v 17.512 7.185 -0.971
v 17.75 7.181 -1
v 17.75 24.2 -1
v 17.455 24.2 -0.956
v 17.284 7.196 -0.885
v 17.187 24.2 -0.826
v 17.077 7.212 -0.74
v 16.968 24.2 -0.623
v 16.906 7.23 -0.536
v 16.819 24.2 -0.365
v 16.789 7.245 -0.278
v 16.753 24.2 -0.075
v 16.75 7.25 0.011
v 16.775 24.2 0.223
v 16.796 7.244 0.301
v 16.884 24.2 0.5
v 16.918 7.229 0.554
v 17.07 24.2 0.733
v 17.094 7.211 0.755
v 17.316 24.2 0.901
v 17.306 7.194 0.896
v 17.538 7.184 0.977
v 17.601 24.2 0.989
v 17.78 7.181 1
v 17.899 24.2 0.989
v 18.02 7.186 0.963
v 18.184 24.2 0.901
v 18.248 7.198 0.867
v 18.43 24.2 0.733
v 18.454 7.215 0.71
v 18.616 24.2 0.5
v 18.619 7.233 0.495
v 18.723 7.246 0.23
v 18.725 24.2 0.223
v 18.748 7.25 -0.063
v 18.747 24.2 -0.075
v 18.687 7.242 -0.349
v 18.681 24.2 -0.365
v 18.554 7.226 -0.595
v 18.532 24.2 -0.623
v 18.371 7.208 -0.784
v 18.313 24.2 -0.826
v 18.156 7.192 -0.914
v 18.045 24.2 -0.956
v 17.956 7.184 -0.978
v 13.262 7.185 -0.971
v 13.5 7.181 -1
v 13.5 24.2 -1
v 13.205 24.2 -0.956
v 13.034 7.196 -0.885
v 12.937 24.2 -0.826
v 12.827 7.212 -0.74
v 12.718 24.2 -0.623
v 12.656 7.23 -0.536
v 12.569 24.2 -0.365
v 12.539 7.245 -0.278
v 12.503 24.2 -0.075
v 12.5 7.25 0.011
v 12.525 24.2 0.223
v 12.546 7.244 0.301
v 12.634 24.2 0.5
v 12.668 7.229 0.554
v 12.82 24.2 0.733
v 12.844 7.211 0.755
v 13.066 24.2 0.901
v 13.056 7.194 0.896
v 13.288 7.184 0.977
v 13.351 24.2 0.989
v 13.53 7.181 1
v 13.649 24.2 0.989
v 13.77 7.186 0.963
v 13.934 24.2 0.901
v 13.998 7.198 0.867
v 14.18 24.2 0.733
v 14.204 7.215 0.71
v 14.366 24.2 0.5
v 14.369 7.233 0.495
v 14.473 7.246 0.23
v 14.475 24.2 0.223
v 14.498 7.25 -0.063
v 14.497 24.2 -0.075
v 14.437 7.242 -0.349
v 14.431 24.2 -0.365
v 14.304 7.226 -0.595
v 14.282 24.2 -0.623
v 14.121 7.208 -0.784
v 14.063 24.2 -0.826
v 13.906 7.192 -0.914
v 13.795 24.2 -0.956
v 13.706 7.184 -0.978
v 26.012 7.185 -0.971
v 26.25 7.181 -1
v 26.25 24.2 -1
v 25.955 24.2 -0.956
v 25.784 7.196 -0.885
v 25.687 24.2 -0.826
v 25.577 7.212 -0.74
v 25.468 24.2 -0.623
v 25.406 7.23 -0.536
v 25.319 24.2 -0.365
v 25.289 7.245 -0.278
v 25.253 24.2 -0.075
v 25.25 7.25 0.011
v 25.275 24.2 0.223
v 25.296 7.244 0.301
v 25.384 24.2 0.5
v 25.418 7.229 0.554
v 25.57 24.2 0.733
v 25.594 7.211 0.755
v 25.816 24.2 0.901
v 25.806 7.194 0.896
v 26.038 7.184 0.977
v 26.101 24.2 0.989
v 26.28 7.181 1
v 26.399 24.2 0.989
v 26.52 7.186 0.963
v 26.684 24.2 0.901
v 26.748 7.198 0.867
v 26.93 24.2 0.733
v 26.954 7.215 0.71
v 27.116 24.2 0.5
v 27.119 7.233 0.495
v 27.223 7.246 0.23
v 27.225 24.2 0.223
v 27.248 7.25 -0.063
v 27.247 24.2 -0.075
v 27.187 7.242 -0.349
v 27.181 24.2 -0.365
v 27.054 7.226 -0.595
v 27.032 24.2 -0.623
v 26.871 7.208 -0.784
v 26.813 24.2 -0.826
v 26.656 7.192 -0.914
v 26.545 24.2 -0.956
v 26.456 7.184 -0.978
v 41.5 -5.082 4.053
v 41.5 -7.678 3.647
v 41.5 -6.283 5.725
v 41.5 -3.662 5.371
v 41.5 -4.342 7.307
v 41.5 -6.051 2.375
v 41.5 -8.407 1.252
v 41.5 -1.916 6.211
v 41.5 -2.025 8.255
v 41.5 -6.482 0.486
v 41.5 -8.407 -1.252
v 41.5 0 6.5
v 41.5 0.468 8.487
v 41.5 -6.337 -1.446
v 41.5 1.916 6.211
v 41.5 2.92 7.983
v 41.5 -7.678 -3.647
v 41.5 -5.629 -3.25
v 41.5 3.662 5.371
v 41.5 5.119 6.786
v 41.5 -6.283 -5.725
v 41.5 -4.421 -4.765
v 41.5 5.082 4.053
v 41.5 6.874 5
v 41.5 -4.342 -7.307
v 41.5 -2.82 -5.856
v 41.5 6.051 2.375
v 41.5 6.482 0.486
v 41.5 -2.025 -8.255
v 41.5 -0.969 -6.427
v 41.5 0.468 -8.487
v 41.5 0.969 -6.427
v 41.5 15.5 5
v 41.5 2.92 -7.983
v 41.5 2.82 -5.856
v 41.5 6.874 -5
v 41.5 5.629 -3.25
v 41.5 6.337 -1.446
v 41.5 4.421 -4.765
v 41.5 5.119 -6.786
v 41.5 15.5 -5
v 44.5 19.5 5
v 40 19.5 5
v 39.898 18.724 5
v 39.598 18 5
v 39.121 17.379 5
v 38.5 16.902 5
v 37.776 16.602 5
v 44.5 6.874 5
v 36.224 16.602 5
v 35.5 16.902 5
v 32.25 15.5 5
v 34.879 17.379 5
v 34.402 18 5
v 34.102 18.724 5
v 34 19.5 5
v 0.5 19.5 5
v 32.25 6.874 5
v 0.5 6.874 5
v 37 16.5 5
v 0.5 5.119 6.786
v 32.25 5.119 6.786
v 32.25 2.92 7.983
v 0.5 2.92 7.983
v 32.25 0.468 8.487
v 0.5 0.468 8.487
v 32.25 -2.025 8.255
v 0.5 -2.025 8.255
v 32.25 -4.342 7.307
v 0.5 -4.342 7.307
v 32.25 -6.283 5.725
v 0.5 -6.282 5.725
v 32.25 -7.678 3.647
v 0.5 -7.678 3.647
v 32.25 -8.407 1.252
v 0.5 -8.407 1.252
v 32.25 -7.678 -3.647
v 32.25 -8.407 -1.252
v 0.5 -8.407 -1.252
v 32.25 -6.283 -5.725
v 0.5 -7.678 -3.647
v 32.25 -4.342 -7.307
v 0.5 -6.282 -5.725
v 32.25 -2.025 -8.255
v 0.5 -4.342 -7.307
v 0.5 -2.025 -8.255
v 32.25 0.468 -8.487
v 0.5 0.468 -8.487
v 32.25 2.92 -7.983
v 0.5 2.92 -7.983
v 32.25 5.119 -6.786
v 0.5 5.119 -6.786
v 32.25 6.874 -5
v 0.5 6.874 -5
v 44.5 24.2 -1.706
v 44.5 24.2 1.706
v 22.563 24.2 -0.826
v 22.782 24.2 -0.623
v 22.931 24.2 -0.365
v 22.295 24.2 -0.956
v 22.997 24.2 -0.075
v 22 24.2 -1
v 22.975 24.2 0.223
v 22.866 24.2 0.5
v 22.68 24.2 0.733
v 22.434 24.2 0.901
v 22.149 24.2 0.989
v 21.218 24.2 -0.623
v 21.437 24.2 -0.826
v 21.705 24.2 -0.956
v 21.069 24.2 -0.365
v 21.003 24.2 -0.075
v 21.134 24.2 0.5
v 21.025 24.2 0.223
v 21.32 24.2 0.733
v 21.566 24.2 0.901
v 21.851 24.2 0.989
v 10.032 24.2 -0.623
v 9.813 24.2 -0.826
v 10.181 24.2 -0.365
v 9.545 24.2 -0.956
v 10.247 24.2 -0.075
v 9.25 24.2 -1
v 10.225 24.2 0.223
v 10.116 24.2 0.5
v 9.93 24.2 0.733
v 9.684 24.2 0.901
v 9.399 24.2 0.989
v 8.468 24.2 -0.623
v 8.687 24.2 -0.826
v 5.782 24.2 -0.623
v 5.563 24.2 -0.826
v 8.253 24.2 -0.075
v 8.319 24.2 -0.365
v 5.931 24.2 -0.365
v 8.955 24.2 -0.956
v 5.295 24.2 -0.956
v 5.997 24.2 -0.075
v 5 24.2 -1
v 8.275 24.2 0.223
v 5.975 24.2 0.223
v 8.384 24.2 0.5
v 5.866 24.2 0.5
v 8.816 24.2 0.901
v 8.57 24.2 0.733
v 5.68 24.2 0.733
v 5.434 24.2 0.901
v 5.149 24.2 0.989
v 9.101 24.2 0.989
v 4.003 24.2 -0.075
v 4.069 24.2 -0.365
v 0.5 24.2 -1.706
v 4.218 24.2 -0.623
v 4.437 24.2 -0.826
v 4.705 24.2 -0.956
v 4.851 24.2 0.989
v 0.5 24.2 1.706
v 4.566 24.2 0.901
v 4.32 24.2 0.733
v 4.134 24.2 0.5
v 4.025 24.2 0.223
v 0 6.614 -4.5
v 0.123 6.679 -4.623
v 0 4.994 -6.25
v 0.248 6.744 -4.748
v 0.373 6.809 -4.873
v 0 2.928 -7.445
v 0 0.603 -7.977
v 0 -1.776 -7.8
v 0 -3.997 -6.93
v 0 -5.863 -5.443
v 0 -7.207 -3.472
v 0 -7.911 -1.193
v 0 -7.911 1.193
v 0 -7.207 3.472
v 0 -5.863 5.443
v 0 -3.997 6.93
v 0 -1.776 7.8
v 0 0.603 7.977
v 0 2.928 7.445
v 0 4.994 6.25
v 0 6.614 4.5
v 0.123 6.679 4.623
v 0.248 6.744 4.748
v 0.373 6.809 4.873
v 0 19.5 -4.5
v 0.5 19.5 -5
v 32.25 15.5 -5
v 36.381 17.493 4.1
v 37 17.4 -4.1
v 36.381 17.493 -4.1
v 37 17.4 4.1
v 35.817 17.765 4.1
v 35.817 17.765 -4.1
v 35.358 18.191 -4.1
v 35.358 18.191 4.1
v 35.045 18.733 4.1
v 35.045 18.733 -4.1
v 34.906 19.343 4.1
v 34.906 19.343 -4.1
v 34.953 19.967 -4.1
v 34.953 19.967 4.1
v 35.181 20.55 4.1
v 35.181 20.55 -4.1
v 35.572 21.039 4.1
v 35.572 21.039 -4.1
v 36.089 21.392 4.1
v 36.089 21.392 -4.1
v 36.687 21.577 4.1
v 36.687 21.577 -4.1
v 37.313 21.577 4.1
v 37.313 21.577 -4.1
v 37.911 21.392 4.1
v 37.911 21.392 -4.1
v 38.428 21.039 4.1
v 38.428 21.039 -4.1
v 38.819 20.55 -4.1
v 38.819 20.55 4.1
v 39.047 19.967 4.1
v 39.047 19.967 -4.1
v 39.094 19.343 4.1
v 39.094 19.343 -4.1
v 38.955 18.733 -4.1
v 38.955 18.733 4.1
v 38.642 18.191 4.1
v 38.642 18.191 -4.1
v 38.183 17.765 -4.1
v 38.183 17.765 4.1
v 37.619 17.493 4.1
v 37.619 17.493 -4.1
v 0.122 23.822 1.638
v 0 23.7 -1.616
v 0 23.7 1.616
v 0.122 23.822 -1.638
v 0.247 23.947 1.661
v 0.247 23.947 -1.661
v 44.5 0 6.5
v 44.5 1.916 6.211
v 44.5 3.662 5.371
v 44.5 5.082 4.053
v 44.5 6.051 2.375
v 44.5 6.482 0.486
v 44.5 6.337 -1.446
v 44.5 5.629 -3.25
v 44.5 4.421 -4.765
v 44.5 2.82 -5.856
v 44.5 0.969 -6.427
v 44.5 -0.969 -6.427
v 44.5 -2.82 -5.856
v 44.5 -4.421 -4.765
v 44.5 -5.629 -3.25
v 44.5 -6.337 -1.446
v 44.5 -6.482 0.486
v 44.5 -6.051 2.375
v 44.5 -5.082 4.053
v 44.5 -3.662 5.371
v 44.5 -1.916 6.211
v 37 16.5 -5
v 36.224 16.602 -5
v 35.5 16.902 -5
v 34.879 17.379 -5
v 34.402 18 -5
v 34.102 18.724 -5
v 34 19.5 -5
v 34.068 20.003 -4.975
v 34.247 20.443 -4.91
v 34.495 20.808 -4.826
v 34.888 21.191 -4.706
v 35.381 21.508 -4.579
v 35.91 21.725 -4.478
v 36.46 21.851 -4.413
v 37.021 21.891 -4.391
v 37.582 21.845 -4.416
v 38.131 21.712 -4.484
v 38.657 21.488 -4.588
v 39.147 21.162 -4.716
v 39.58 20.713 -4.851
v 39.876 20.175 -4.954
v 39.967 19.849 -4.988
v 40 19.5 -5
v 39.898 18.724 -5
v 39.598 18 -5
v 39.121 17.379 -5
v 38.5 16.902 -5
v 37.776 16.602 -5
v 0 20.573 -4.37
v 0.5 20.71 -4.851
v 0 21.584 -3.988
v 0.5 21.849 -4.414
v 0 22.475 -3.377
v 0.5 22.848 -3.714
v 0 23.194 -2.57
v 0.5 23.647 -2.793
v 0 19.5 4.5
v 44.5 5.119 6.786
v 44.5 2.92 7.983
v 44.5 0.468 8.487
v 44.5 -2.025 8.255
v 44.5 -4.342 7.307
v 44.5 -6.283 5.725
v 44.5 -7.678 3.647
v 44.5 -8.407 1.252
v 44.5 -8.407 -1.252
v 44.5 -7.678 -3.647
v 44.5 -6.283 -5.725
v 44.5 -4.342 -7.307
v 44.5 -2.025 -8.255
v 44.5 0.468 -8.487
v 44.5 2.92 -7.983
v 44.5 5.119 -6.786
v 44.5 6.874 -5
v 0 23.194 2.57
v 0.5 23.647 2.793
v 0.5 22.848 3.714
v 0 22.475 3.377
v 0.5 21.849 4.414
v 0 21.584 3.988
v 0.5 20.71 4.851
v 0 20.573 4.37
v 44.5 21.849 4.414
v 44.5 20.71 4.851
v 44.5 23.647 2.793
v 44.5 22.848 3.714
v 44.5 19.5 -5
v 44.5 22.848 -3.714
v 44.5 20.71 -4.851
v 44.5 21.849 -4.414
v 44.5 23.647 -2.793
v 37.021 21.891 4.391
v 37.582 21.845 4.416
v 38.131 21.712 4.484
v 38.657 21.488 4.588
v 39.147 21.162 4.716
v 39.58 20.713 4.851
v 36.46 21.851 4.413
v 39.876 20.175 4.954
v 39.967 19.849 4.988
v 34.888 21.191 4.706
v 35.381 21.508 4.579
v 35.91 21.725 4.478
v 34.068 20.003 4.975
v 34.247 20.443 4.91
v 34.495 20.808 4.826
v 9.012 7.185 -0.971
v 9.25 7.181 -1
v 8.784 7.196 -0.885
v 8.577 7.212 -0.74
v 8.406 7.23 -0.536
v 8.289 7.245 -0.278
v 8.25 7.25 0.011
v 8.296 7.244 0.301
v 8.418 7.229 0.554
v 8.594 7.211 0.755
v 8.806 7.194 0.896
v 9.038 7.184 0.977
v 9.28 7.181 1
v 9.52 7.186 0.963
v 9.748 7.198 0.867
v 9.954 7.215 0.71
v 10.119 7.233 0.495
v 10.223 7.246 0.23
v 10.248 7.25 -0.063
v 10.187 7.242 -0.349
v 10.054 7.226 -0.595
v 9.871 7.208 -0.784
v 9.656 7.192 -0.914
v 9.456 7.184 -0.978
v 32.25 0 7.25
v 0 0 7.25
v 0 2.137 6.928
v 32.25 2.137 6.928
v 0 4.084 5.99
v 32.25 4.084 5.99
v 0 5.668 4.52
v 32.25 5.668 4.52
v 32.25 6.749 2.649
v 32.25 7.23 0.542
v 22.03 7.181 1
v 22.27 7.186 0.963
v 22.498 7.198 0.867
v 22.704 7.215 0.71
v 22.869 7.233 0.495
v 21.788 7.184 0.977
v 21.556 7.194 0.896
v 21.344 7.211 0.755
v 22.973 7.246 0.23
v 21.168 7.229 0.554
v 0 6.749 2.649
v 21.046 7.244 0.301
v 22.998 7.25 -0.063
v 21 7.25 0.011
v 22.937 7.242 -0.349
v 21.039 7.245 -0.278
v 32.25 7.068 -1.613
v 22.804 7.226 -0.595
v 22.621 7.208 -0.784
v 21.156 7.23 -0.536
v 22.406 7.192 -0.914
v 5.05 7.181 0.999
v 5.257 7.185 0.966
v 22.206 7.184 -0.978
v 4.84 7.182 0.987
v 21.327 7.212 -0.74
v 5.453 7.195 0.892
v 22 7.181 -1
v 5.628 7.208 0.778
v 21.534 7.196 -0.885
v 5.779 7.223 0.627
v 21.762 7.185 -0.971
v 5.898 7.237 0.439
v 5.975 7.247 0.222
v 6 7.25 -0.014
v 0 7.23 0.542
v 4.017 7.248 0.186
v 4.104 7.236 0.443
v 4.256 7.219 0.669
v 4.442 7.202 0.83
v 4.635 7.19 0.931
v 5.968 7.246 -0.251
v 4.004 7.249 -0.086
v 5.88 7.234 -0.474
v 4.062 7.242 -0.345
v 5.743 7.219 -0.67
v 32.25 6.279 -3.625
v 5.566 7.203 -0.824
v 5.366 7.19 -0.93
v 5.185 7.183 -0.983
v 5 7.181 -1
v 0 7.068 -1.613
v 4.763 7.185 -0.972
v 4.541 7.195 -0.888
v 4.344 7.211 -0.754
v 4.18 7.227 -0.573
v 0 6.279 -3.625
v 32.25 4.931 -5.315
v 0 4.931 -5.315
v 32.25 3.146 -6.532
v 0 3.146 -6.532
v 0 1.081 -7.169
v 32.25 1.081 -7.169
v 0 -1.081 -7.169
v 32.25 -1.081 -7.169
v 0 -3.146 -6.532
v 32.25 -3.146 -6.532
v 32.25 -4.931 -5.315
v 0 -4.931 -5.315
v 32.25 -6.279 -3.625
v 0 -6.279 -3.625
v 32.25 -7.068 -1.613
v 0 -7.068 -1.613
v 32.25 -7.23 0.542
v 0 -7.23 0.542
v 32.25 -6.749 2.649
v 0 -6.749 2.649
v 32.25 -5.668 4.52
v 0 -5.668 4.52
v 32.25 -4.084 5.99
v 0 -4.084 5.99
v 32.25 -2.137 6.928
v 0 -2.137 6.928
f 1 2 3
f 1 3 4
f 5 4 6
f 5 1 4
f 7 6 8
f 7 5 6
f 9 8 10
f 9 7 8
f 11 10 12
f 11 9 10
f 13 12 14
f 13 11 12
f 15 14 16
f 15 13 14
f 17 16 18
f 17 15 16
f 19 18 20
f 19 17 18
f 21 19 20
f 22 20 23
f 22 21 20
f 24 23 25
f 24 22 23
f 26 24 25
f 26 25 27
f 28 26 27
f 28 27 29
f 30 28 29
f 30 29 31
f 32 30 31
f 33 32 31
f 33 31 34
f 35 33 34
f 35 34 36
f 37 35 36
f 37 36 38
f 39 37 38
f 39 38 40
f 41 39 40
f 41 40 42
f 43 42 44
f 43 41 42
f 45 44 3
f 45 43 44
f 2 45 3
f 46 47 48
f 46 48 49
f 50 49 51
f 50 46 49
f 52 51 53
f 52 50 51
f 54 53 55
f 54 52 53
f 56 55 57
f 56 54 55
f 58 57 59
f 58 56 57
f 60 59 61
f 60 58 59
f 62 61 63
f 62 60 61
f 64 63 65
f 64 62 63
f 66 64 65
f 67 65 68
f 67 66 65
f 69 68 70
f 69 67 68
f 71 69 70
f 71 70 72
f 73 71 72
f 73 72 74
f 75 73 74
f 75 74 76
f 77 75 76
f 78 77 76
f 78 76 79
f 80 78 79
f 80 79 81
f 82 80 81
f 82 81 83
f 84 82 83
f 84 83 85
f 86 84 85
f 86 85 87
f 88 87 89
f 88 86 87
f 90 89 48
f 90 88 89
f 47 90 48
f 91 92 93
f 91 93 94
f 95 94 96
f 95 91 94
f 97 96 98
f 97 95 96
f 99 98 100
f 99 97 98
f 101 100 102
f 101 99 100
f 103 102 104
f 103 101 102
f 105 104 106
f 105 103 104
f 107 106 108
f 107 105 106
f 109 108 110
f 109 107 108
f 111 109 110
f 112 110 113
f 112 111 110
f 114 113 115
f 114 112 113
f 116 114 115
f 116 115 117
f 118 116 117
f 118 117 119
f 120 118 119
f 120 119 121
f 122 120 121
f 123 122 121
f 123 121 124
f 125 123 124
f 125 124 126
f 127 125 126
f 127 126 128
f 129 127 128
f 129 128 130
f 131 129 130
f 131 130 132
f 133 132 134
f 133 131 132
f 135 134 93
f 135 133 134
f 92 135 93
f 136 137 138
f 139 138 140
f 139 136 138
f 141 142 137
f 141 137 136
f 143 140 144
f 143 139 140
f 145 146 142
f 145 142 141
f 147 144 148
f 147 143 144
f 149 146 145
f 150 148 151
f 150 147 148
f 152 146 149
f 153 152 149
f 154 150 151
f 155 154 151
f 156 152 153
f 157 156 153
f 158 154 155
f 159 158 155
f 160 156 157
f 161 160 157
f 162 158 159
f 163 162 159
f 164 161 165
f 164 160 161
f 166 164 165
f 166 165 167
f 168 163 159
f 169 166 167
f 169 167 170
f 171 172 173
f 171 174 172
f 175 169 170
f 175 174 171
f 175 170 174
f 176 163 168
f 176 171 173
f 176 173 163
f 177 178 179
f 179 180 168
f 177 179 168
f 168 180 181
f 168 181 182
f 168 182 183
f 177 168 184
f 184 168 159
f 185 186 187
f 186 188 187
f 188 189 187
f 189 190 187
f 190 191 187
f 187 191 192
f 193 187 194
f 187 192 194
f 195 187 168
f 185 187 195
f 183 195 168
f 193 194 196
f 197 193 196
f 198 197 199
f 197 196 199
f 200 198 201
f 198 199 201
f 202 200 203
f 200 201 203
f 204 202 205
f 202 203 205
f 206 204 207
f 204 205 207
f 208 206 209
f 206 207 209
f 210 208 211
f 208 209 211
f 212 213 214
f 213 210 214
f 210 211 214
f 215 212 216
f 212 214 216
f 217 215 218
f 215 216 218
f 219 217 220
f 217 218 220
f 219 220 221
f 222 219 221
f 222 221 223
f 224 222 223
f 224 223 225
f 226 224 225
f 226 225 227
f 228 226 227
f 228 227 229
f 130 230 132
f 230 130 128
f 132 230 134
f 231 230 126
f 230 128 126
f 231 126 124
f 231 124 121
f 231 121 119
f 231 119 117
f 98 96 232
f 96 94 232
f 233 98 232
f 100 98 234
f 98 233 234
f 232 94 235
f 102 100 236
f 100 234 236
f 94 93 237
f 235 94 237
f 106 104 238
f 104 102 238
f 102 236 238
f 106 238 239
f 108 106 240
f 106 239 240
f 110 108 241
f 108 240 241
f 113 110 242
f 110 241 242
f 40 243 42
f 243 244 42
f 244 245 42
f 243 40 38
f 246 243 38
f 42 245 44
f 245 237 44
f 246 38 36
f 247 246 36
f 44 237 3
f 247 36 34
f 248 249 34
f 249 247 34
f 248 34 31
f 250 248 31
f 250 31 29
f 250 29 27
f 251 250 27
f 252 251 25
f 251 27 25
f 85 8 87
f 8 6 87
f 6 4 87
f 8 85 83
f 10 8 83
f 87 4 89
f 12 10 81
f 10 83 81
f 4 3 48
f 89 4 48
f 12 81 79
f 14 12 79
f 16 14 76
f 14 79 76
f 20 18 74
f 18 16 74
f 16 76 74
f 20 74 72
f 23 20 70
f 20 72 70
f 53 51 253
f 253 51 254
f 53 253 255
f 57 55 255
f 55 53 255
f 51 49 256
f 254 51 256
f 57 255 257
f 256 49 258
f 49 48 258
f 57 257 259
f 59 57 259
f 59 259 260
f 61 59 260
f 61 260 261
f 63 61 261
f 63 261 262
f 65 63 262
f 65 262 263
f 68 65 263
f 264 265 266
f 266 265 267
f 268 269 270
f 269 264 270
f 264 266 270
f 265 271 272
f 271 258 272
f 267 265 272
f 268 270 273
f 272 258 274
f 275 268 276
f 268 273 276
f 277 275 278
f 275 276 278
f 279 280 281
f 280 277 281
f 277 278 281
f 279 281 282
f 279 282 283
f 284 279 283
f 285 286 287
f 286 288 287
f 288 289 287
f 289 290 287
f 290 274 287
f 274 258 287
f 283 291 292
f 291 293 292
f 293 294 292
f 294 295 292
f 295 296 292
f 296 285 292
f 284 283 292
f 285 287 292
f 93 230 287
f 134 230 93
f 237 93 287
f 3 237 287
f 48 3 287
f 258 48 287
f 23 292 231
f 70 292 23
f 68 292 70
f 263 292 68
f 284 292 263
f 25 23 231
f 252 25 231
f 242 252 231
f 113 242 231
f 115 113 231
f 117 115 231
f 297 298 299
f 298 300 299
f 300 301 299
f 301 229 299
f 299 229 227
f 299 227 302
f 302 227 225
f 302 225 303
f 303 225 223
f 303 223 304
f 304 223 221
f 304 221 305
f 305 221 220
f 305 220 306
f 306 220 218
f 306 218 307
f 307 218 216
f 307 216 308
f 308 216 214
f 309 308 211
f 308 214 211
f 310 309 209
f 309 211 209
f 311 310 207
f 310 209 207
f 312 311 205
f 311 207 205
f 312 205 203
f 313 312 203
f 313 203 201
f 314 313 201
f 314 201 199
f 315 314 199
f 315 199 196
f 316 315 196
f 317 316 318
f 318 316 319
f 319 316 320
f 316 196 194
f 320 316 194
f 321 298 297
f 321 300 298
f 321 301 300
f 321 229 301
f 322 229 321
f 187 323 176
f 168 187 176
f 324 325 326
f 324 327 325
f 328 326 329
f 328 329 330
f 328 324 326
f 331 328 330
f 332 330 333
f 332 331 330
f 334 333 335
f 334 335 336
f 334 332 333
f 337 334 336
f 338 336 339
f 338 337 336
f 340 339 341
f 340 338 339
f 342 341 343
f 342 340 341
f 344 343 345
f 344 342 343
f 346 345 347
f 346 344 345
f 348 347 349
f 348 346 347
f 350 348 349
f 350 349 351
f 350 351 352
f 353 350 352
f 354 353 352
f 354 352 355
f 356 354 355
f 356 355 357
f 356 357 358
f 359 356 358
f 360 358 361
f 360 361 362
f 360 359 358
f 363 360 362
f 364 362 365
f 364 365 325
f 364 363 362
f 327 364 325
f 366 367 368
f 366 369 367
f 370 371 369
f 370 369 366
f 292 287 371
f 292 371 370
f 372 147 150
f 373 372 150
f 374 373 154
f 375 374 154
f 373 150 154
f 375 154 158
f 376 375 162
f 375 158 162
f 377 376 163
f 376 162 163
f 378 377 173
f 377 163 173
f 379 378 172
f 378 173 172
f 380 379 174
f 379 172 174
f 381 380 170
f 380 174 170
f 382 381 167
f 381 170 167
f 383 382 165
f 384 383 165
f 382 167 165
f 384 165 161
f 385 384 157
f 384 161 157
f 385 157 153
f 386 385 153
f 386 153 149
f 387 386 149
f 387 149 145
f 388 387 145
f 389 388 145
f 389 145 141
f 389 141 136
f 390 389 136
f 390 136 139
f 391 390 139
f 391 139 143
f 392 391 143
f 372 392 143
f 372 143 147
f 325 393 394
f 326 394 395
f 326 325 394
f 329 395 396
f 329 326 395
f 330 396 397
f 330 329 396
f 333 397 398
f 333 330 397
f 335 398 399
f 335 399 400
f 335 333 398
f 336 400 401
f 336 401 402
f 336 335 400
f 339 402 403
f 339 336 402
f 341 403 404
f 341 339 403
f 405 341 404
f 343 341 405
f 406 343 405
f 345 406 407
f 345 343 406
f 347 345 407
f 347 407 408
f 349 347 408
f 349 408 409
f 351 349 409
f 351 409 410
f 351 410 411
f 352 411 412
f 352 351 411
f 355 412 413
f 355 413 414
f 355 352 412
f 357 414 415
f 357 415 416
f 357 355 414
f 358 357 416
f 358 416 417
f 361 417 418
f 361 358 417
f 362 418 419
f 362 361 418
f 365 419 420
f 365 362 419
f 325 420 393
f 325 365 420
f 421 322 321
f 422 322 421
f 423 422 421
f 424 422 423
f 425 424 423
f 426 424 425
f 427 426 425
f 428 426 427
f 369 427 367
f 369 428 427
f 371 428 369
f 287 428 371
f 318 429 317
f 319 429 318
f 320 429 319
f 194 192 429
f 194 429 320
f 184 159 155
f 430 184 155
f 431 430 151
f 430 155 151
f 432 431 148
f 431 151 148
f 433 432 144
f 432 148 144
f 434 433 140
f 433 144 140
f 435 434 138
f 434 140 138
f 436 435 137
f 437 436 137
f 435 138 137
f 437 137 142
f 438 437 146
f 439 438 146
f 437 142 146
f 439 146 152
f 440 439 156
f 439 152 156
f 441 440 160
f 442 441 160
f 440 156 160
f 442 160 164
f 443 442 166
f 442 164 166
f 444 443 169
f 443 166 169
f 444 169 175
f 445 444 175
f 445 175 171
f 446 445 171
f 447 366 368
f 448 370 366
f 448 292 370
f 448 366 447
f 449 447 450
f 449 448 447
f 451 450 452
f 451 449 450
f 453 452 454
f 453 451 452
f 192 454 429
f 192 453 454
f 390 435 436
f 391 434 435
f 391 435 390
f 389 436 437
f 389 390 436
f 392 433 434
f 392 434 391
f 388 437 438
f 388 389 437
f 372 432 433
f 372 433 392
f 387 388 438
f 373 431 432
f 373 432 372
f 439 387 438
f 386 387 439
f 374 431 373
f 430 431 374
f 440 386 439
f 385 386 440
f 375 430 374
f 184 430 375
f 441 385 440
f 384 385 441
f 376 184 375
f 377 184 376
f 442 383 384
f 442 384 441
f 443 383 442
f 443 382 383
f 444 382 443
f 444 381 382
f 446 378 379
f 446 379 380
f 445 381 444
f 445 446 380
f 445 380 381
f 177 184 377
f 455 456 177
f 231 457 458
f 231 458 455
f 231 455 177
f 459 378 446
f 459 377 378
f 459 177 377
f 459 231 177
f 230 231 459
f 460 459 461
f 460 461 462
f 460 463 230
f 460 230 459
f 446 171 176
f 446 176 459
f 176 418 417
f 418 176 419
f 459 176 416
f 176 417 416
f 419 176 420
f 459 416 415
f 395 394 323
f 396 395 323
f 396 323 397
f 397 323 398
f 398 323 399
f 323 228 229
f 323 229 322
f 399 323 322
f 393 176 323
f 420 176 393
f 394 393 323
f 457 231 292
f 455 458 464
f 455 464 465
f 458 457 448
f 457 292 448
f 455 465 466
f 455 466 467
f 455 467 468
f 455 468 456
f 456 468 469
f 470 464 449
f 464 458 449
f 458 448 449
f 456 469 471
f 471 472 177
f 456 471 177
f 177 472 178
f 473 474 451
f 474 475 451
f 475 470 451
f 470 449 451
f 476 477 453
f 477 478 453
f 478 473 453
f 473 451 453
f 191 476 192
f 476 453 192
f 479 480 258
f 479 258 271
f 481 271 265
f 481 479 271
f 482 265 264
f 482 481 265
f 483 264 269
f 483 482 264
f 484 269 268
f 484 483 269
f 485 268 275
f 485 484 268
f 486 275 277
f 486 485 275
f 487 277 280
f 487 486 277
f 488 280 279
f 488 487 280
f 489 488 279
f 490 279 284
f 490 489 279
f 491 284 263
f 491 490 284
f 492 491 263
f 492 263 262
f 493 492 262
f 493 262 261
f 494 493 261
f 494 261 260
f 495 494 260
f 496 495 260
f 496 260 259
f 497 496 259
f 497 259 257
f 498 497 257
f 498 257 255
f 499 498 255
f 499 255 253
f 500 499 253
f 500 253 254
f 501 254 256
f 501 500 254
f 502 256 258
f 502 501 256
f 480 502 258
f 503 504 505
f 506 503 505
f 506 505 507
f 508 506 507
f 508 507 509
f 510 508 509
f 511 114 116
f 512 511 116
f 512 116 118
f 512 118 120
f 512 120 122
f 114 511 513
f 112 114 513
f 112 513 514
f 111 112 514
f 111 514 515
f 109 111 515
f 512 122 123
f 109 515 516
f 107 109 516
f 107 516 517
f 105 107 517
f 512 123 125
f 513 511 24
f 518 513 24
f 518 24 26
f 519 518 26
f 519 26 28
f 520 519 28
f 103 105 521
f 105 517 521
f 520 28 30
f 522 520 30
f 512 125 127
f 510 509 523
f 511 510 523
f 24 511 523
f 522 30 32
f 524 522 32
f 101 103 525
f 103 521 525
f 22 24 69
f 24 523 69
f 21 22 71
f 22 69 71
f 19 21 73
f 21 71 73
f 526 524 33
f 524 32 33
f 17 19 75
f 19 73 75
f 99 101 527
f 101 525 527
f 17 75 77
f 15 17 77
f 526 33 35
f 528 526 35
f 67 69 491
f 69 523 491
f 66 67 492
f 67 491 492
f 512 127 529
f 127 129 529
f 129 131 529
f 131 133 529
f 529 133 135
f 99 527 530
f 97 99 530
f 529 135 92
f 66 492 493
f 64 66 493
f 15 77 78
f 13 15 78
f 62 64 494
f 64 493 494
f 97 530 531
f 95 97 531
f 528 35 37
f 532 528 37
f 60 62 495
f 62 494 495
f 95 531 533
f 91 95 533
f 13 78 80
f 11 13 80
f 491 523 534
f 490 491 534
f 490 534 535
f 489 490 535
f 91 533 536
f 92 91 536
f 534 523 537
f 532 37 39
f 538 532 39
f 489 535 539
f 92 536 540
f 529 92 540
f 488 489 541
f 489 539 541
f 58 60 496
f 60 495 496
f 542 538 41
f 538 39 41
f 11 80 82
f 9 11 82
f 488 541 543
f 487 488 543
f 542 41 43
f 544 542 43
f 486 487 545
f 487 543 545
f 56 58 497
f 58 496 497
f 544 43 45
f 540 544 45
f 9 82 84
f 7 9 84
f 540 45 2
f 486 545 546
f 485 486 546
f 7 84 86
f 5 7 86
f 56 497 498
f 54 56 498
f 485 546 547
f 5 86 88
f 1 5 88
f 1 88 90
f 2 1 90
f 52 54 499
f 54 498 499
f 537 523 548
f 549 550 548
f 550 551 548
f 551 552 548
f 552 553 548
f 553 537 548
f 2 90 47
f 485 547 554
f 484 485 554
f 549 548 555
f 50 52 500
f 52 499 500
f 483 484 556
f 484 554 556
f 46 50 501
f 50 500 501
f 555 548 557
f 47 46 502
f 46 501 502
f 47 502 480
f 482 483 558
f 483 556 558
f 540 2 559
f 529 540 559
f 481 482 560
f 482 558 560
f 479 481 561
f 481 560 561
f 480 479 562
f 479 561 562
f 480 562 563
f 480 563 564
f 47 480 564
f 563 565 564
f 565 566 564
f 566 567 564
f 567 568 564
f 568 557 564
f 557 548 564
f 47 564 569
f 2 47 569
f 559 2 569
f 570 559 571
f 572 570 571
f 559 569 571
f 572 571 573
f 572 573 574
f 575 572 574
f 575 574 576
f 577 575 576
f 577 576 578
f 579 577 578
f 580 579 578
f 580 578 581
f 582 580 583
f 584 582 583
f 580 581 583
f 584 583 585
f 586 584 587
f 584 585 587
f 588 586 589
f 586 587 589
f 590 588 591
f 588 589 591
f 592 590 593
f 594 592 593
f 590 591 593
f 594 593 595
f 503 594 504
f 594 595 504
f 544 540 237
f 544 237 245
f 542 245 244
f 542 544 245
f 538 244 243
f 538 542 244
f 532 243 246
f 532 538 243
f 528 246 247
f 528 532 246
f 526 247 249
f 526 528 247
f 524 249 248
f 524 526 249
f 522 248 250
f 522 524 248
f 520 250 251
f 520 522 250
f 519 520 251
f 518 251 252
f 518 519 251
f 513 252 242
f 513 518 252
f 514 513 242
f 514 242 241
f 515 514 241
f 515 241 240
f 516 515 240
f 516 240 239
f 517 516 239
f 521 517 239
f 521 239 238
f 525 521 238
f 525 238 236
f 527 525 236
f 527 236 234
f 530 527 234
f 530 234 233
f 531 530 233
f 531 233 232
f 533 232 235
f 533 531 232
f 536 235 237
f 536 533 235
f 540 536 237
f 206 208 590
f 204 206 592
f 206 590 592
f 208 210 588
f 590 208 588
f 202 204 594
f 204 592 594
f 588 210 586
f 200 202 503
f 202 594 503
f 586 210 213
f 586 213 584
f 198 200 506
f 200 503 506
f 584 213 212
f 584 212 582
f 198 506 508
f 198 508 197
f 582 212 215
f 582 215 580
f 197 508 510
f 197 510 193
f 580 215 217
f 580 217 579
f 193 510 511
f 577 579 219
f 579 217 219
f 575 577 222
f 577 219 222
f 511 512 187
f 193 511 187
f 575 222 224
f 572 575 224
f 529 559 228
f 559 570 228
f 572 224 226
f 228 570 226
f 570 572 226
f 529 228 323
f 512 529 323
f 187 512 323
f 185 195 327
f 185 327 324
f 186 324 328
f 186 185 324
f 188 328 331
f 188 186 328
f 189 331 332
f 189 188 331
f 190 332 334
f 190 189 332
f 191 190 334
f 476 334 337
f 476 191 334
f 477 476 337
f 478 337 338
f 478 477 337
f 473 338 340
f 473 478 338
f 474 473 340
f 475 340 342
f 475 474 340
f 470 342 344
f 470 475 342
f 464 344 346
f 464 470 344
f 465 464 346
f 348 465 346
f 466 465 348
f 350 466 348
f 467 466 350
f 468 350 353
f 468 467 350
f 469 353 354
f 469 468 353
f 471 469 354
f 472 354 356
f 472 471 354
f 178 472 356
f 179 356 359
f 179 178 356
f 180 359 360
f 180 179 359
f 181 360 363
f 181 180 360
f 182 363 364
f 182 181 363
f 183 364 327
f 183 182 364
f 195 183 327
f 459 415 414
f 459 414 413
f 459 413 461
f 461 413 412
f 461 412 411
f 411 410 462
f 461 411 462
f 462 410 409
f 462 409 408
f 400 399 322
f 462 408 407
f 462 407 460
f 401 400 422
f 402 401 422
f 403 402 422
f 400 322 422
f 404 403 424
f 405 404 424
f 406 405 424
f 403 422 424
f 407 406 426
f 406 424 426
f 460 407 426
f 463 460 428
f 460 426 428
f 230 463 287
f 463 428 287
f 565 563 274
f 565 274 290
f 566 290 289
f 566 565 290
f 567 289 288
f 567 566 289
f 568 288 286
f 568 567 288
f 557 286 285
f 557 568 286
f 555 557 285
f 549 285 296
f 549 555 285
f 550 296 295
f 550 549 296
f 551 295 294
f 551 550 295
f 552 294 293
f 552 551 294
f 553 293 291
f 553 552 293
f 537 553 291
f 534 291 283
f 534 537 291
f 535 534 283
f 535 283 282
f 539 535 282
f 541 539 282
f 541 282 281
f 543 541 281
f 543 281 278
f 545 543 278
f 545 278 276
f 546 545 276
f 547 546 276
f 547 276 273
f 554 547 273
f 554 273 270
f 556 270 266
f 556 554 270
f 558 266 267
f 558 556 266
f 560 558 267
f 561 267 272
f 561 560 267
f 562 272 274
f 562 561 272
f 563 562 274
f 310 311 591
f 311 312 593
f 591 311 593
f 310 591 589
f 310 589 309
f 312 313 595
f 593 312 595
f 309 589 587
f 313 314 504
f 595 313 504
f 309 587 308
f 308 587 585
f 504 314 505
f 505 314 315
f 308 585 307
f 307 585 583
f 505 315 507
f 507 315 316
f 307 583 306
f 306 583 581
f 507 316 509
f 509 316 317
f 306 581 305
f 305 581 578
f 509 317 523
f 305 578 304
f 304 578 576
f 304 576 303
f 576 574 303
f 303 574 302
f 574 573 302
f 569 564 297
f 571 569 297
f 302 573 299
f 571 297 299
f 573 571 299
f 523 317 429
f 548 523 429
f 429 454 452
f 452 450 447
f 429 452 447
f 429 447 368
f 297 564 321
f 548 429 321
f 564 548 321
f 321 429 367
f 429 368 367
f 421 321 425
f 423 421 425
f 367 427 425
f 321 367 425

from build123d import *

# Parameters (mm, degrees)
EURO_CYLINDER_OUTLINE_DEPTH = 44.5
SKETCH9_R                   = 7.25
BORE_FOR_CORE_DEPTH         = 37
SKETCH2_R                   = 1
HOLE_FOR_PIN_DEPTH          = 35
LPATTERN_OF_6_COUNT         = 6
LPATTERN_OF_6_PITCH         = 4.25
OPENNING_DEPTH              = 53.422705051
OPENNING_DEPTH_BACK         = 53.422705051
SKETCH3_W                   = 9.25
SKETCH3_H                   = 24
F_0_5_X_45_DEG_SIZE         = 0.5
SKETCH10_R                  = 6.5
DIA_13_END_BIT_DEPTH        = 49.786678644


with BuildPart() as part:
    # Sketch1 → euro cylinder outline (new body)
    with BuildSketch(Plane(origin=(0, 0, 0), x_dir=(0, 0, -1), z_dir=(1, 0, 0))):
        with BuildLine():
            Line((-5, 19.5), (-5, 6.873863542))
            ThreePointArc((-5, 6.873863542), (0, -8.5), (5, 6.873863542))
            Line((5, 6.873863542), (5, 19.5))
            ThreePointArc((5, 19.5), (4.094469505, 22.369724634), (1.705872211, 24.2))
            Line((1.705872211, 24.2), (-1.705872211, 24.2))
            ThreePointArc((-1.705872211, 24.2), (-4.094469505, 22.369724634), (-5, 19.5))
        make_face()
    extrude(amount=EURO_CYLINDER_OUTLINE_DEPTH)

    # Sketch9 → bore for core (cut)
    with BuildSketch(Plane.ZY):
        Circle(SKETCH9_R)
    extrude(amount=-BORE_FOR_CORE_DEPTH, mode=Mode.SUBTRACT)

    # Sketch2 → hole for pin (cut)
    with BuildSketch(Plane(origin=(0, 0, 0), x_dir=(1, 0, 0), z_dir=(0, 1, 0))):
        with Locations(Location((5, 0, 0), (0, 0, 90))):
            Circle(SKETCH2_R)
    hole_for_pin = extrude(amount=HOLE_FOR_PIN_DEPTH, mode=Mode.SUBTRACT)

    # LPattern of 6: hole for pin ×6
    with Locations(*[(i * LPATTERN_OF_6_PITCH, 0, 0) for i in range(1, LPATTERN_OF_6_COUNT)]):
        add(hole_for_pin, mode=Mode.SUBTRACT)

    # Sketch3 → openning (cut, two sides: drawn at the far end of the back side and taken through both)
    with BuildSketch(Plane.XY.offset(5).offset(-OPENNING_DEPTH_BACK)):
        with Locations((36.875, 3.5)):
            Rectangle(SKETCH3_W, SKETCH3_H)
    extrude(amount=OPENNING_DEPTH + OPENNING_DEPTH_BACK, mode=Mode.SUBTRACT)

    # Sketch7 → M5x0.8 mounting hole (revolve, cut)
    with BuildSketch(Plane(origin=(37, 19.5, 5), x_dir=(0, -1, 0), z_dir=(1, 0, 0))):
        Polygon((0, 0), (0, 10), (3, 10), (2.1, 9.1), (2.1, 0.9), (3, 0), align=None)
    revolve(axis=Axis((37, 19.5, 11.35), (0, 0, -1)), mode=Mode.SUBTRACT)

    # 0.5 x 45 deg
    f_0_5_x_45_deg_edges = [part.edges().sort_by_distance(p)[0] for p in [
        (0, 24.2, 0),
    ]]
    chamfer(f_0_5_x_45_deg_edges, length=F_0_5_X_45_DEG_SIZE)
    f_0_5_x_45_deg_2_edges = [part.edges().sort_by_distance(p)[0] for p in [
        (0, 21.891164992, -4.391164992),
        (0, 13.186931771, -5),
    ]]
    chamfer(f_0_5_x_45_deg_2_edges, length=F_0_5_X_45_DEG_SIZE)
    f_0_5_x_45_deg_3_edges = [part.edges().sort_by_distance(p)[0] for p in [
        (0, 21.891164992, 4.391164992),
        (0, 13.186931771, 5),
    ]]
    chamfer(f_0_5_x_45_deg_3_edges, length=F_0_5_X_45_DEG_SIZE)
    f_0_5_x_45_deg_4_edges = [part.edges().sort_by_distance(p)[0] for p in [
        (0, -8.5, 0),
    ]]
    chamfer(f_0_5_x_45_deg_4_edges, length=F_0_5_X_45_DEG_SIZE - 0.0001)  # a hair under: the kernel refuses the full size

    # Sketch10 → dia 13 end bit (cut, through all)
    with BuildSketch(Plane.ZY.offset(-41.5)):
        Circle(SKETCH10_R)
    extrude(amount=-DIA_13_END_BIT_DEPTH, mode=Mode.SUBTRACT)


solid = part.part
